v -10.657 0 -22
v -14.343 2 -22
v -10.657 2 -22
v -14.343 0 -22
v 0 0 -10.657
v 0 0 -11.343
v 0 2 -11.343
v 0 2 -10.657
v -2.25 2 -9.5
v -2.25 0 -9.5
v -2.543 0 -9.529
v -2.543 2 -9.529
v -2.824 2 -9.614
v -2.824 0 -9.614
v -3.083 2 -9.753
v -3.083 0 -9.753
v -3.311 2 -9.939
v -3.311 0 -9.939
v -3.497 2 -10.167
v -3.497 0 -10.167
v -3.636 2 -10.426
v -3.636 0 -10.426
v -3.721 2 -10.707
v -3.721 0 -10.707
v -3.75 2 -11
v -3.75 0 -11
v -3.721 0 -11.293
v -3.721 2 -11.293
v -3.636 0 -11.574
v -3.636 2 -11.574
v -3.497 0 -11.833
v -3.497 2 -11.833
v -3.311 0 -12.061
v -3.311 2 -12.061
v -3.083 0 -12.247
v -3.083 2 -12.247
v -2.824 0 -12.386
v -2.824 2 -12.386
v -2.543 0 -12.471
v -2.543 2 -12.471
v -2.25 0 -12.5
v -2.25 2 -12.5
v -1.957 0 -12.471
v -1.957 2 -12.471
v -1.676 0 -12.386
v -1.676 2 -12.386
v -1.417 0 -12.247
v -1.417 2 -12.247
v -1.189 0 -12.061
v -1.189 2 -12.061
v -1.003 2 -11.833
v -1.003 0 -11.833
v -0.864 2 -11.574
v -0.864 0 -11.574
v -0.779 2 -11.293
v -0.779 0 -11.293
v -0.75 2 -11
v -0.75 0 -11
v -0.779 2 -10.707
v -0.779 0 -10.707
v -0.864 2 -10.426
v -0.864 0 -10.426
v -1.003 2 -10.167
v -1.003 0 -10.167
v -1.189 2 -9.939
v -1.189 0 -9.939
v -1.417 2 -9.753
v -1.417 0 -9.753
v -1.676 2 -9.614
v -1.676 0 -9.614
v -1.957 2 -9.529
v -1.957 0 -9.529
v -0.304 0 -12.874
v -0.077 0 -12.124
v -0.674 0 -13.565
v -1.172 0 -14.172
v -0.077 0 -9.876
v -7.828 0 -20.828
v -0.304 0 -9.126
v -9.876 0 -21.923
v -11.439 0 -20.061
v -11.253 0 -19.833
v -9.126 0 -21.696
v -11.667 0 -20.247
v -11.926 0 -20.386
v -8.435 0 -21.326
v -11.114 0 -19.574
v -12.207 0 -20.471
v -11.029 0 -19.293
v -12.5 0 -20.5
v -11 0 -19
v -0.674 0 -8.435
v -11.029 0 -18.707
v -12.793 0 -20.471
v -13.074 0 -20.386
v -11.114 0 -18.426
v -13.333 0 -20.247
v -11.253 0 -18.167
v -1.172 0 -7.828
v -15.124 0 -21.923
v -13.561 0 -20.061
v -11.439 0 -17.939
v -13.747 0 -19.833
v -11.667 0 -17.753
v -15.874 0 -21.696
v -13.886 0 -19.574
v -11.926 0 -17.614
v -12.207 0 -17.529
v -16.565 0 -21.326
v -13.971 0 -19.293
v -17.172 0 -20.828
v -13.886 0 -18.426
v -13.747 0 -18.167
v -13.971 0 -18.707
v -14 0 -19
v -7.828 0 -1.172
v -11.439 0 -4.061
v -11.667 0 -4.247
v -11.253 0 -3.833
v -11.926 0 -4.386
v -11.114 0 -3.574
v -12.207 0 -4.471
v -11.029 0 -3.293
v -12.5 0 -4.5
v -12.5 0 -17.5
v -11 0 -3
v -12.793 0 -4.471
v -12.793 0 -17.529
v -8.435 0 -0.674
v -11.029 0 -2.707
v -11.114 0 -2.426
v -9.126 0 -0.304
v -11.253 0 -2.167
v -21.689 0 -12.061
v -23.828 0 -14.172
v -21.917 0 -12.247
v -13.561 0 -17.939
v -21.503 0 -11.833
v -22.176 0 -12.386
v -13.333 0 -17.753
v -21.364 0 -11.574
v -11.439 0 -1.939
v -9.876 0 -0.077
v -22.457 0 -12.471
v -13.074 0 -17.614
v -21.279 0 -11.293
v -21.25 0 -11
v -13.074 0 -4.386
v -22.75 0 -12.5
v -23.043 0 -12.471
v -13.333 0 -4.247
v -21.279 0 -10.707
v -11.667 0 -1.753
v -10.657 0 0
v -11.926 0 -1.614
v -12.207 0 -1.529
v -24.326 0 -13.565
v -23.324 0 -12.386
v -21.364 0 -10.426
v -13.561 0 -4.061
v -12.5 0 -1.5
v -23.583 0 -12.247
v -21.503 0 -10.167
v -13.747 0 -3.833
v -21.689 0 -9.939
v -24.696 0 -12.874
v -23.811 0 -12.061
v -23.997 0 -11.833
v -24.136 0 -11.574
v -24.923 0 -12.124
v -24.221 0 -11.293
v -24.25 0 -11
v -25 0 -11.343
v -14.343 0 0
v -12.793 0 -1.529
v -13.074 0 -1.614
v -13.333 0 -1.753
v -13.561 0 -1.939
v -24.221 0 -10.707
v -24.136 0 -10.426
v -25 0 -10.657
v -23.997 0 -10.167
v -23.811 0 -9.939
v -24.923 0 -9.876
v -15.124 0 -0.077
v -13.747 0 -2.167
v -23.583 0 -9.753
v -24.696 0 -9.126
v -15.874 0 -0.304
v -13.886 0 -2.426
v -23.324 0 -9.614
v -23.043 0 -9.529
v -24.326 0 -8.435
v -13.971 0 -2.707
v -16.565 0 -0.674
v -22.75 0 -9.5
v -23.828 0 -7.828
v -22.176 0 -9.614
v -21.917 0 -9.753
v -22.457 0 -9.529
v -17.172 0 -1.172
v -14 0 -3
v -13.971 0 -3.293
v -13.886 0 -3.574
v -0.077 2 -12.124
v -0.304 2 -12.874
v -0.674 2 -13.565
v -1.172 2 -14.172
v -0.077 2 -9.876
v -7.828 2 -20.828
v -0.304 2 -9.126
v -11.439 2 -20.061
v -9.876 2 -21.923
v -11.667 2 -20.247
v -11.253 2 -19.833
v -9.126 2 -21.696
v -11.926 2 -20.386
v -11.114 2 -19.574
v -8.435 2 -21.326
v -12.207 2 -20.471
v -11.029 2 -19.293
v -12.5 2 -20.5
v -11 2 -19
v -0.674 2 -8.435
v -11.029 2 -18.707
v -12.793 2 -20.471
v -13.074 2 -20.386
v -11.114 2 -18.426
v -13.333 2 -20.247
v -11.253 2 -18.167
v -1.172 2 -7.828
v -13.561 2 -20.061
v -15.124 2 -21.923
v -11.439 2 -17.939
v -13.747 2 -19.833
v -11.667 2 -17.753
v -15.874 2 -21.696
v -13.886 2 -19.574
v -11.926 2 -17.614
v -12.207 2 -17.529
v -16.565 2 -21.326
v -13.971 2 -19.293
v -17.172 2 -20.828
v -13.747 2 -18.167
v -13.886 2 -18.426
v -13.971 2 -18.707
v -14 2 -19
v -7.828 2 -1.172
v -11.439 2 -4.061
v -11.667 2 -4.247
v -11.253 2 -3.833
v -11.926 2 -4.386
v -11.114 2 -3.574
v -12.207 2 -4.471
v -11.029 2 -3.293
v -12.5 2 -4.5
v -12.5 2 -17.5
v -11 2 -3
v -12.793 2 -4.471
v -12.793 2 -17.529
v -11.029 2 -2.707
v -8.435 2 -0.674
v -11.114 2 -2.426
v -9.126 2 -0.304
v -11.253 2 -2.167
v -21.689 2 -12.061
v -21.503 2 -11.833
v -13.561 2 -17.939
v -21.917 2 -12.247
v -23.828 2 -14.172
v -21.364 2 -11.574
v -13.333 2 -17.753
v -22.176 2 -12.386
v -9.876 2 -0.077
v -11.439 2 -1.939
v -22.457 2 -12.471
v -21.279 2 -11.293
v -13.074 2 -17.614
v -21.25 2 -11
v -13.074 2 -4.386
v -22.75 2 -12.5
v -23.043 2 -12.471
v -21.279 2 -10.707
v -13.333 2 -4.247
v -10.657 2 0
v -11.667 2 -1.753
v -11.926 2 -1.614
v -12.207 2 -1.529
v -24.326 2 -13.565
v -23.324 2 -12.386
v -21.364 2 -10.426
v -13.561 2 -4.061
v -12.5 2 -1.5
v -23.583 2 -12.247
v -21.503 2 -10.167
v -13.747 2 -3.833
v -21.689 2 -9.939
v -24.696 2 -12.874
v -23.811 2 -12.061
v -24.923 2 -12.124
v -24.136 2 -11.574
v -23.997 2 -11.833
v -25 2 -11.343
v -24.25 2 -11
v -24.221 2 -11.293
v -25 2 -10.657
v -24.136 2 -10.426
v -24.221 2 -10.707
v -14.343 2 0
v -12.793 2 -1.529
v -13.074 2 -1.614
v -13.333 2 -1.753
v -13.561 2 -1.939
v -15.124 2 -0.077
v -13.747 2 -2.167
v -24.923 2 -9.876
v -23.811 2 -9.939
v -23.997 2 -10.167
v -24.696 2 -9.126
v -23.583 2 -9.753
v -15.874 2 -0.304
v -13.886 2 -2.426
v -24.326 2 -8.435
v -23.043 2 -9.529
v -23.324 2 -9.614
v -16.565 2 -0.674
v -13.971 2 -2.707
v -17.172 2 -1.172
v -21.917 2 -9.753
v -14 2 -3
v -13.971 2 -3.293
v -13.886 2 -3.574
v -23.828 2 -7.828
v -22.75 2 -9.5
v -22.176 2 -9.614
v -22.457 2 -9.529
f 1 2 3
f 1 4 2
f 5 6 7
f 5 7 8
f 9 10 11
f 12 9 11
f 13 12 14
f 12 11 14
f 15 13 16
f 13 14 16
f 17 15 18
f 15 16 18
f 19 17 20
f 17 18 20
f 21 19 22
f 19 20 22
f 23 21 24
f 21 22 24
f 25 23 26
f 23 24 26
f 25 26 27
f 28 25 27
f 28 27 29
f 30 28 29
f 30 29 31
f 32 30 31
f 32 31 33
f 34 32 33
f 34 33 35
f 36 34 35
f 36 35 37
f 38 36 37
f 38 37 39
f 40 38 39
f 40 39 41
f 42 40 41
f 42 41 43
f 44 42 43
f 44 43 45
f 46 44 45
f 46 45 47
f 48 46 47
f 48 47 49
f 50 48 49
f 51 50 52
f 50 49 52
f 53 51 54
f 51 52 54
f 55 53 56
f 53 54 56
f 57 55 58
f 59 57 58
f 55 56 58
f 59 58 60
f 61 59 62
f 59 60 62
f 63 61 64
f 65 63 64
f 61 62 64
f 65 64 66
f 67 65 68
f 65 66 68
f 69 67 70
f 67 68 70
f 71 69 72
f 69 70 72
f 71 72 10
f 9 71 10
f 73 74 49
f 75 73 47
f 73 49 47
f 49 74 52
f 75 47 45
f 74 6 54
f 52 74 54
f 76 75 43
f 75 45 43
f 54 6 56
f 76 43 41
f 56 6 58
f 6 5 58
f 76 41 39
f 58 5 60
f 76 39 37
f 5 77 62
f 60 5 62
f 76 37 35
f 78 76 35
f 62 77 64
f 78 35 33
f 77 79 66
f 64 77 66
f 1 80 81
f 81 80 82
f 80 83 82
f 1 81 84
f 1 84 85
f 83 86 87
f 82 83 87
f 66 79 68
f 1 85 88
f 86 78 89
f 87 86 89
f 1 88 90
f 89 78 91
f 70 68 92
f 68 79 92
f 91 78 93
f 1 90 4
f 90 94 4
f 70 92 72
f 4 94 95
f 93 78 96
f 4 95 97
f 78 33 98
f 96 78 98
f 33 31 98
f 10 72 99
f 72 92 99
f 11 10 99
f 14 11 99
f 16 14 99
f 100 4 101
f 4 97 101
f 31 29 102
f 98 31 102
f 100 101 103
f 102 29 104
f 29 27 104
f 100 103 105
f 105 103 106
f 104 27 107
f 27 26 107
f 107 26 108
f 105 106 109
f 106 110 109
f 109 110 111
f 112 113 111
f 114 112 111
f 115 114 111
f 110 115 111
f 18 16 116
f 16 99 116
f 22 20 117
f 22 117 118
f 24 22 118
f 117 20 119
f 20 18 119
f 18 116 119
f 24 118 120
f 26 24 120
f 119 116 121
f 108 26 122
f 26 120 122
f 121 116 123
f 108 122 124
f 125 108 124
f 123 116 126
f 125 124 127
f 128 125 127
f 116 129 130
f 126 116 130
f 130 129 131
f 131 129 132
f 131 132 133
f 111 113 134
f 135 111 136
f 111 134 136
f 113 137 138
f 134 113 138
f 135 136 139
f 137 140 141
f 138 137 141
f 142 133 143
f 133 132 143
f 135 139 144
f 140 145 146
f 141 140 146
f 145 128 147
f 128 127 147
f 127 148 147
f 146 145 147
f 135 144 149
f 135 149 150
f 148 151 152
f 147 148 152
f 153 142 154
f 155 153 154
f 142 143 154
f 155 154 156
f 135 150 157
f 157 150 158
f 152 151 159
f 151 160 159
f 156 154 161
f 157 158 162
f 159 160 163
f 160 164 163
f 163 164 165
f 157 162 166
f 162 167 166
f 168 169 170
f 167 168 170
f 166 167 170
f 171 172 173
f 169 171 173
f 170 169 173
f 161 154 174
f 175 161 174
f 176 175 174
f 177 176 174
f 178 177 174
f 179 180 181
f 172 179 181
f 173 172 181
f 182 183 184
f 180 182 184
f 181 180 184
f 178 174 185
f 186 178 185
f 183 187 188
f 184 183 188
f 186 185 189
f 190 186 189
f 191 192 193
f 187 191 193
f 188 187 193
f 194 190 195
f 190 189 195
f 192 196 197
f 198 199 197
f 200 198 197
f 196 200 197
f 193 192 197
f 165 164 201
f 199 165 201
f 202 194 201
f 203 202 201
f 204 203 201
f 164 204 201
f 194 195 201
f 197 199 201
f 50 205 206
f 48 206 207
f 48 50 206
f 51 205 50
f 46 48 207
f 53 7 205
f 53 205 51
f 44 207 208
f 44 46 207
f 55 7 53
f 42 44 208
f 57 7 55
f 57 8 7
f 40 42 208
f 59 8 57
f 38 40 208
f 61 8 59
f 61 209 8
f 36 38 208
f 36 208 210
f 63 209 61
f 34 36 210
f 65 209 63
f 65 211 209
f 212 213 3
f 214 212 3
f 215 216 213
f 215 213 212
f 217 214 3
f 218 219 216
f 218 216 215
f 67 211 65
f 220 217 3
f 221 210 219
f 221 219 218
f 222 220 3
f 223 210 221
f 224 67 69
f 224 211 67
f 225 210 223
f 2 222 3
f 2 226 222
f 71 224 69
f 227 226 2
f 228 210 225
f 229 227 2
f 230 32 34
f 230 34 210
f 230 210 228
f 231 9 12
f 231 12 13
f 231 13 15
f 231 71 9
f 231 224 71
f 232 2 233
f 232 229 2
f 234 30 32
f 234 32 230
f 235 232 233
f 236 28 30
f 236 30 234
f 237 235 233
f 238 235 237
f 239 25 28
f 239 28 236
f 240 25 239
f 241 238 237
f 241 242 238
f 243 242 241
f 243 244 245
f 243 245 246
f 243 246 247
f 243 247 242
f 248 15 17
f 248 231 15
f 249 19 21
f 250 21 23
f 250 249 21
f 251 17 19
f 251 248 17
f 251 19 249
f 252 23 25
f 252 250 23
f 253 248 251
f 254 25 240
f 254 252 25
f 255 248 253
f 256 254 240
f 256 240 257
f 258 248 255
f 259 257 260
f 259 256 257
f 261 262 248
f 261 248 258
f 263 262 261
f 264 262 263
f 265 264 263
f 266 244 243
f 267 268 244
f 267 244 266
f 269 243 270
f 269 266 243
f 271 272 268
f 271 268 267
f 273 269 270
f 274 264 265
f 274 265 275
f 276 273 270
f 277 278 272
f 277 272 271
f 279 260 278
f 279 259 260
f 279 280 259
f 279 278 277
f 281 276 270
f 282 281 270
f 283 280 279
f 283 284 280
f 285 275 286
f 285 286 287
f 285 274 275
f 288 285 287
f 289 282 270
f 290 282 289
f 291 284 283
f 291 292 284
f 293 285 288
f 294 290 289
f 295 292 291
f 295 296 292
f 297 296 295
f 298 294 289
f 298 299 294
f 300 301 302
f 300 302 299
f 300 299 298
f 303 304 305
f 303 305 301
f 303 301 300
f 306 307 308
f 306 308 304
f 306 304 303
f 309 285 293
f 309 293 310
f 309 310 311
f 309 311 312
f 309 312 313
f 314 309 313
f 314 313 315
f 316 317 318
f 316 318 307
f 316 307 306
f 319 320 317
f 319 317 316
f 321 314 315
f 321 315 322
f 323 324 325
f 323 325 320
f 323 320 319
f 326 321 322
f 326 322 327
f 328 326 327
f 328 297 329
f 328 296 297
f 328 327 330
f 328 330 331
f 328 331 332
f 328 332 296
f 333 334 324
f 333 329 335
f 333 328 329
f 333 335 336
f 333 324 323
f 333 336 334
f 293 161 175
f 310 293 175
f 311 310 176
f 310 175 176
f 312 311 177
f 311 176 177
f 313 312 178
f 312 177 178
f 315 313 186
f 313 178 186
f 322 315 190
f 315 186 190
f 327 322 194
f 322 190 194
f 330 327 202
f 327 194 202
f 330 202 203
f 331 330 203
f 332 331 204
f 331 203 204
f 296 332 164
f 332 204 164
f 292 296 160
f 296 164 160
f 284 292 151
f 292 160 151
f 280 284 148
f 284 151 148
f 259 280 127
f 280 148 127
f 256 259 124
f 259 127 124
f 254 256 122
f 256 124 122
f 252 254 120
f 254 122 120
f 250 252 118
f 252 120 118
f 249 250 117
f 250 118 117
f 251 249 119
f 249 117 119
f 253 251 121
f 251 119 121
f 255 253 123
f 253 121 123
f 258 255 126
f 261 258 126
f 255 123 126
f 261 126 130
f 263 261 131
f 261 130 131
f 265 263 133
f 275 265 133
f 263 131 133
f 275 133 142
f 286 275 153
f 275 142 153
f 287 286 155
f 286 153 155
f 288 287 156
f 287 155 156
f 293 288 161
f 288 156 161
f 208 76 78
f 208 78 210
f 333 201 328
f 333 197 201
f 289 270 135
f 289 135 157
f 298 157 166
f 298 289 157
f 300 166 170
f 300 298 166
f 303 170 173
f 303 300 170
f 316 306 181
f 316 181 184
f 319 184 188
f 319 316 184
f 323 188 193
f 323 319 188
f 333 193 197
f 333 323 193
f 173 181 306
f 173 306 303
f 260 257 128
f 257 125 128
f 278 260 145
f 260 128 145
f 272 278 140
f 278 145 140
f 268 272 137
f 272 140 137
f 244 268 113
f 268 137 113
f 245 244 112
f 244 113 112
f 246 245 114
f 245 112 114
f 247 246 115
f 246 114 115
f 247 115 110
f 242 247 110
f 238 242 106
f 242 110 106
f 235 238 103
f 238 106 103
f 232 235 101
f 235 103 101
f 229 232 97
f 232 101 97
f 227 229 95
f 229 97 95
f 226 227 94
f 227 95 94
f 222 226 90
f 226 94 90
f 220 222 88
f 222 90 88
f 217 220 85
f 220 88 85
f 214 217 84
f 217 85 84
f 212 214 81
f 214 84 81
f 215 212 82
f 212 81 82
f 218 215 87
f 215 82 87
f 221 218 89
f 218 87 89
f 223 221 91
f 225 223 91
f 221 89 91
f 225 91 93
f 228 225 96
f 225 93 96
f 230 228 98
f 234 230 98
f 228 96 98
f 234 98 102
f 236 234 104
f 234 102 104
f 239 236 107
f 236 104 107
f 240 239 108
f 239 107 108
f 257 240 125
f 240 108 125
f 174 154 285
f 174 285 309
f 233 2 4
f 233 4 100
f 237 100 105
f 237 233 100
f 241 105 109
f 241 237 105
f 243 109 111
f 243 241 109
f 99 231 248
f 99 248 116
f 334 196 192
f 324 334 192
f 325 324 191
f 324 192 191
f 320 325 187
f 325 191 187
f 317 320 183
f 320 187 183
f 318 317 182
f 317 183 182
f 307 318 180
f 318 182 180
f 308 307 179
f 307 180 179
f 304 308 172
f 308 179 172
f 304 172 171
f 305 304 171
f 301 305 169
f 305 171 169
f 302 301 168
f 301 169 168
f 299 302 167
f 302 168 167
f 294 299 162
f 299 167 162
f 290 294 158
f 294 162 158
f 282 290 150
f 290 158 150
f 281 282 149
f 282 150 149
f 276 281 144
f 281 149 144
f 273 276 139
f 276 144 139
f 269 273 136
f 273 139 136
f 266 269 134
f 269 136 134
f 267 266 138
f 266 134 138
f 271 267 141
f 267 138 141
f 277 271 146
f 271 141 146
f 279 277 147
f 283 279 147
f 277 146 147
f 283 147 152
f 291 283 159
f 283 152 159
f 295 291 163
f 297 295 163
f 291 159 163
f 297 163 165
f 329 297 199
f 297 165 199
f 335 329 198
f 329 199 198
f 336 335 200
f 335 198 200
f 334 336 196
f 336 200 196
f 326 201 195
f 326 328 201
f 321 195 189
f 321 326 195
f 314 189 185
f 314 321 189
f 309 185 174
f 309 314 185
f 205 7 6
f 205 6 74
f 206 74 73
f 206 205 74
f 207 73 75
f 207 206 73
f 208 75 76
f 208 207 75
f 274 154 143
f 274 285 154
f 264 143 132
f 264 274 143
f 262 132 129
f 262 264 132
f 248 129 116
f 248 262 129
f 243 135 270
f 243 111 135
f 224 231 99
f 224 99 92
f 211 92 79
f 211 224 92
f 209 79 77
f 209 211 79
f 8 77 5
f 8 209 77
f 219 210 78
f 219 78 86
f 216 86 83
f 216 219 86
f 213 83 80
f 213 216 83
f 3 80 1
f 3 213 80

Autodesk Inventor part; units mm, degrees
ref_plane "YZ Plane" through (0, 0, 0) normal (1, 0, 0) x (0, 1, 0)
ref_plane "XZ Plane" through (0, 0, 0) normal (0, 1, 0) x (-1, 0, 0)
ref_plane "XY Plane" through (0, 0, 0) normal (0, 0, 1) x (1, 0, 0)
sketch "Skizze1" plane through (0, 0, 0) normal (0, 1, 0) x (-1, 0, 0)
  line L0 (0, 0) -> (25, 0)
  line L1 (25, 0) -> (25, -22)
  line L2 (25, -22) -> (0, -22)
  line L3 (0, -22) -> (0, 0)
  dimension "d0" = 25
  dimension "d1" = 22
extrude "Extrusion1" add sketch "Skizze1" along normal blind 2
chamfer "Fase1" distance 9 angle 45 4 edges at (0, 1, 0) (0, 1, -22) (-25, 1, -22) (-25, 1, 0)
fillet "Rundung1" radius 4 8 edges at (-25, 1, -13) (-25, 1, -9) (-16, 1, 0) (-9, 1, 0) (0, 1, -9) (0, 1, -13) (-9, 1, -22) (-16, 1, -22)
sketch "Skizze2" plane through (0, 2, 0) normal (0, 1, 0) x (1, 0, 0)
  line L0 (0, 10.6569) -> (0, 11.3431) projected
  line L1 (-14.3431, 0) -> (-10.6569, 0) projected
  point P0 (0, 0)
  point P1 (-2.25, 11)
  point P2 (-22.75, 11)
  dimension "d8" = 2.25
  dimension "d9" = 20.5
  dimension "d10" = 11
sketch "Skizze3" plane through (0, 2, 0) normal (0, 1, 0) x (1, 0, 0)
  line L0 (-14.3431, 0) -> (-10.6569, 0) projected
  line L1 (0, 10.6569) -> (0, 11.3431) projected
  point P0 (0, 0)
  point P1 (-12.5, 3)
  point P2 (-12.5, 19)
  dimension "d11" = 16
  dimension "d12" = 3
  dimension "d13" = 12.5
hole "Bohrung1" at (-12.5, 2, -3) at (-12.5, 2, -19) direction (0, -1, 0) diameter 3 depth 8 tip angle 118
hole "Bohrung2" at (-2.25, 2, -11) at (-22.75, 2, -11) direction (0, -1, 0) diameter 3 depth 8 tip angle 118
properties part number "KugelradAdapter"
